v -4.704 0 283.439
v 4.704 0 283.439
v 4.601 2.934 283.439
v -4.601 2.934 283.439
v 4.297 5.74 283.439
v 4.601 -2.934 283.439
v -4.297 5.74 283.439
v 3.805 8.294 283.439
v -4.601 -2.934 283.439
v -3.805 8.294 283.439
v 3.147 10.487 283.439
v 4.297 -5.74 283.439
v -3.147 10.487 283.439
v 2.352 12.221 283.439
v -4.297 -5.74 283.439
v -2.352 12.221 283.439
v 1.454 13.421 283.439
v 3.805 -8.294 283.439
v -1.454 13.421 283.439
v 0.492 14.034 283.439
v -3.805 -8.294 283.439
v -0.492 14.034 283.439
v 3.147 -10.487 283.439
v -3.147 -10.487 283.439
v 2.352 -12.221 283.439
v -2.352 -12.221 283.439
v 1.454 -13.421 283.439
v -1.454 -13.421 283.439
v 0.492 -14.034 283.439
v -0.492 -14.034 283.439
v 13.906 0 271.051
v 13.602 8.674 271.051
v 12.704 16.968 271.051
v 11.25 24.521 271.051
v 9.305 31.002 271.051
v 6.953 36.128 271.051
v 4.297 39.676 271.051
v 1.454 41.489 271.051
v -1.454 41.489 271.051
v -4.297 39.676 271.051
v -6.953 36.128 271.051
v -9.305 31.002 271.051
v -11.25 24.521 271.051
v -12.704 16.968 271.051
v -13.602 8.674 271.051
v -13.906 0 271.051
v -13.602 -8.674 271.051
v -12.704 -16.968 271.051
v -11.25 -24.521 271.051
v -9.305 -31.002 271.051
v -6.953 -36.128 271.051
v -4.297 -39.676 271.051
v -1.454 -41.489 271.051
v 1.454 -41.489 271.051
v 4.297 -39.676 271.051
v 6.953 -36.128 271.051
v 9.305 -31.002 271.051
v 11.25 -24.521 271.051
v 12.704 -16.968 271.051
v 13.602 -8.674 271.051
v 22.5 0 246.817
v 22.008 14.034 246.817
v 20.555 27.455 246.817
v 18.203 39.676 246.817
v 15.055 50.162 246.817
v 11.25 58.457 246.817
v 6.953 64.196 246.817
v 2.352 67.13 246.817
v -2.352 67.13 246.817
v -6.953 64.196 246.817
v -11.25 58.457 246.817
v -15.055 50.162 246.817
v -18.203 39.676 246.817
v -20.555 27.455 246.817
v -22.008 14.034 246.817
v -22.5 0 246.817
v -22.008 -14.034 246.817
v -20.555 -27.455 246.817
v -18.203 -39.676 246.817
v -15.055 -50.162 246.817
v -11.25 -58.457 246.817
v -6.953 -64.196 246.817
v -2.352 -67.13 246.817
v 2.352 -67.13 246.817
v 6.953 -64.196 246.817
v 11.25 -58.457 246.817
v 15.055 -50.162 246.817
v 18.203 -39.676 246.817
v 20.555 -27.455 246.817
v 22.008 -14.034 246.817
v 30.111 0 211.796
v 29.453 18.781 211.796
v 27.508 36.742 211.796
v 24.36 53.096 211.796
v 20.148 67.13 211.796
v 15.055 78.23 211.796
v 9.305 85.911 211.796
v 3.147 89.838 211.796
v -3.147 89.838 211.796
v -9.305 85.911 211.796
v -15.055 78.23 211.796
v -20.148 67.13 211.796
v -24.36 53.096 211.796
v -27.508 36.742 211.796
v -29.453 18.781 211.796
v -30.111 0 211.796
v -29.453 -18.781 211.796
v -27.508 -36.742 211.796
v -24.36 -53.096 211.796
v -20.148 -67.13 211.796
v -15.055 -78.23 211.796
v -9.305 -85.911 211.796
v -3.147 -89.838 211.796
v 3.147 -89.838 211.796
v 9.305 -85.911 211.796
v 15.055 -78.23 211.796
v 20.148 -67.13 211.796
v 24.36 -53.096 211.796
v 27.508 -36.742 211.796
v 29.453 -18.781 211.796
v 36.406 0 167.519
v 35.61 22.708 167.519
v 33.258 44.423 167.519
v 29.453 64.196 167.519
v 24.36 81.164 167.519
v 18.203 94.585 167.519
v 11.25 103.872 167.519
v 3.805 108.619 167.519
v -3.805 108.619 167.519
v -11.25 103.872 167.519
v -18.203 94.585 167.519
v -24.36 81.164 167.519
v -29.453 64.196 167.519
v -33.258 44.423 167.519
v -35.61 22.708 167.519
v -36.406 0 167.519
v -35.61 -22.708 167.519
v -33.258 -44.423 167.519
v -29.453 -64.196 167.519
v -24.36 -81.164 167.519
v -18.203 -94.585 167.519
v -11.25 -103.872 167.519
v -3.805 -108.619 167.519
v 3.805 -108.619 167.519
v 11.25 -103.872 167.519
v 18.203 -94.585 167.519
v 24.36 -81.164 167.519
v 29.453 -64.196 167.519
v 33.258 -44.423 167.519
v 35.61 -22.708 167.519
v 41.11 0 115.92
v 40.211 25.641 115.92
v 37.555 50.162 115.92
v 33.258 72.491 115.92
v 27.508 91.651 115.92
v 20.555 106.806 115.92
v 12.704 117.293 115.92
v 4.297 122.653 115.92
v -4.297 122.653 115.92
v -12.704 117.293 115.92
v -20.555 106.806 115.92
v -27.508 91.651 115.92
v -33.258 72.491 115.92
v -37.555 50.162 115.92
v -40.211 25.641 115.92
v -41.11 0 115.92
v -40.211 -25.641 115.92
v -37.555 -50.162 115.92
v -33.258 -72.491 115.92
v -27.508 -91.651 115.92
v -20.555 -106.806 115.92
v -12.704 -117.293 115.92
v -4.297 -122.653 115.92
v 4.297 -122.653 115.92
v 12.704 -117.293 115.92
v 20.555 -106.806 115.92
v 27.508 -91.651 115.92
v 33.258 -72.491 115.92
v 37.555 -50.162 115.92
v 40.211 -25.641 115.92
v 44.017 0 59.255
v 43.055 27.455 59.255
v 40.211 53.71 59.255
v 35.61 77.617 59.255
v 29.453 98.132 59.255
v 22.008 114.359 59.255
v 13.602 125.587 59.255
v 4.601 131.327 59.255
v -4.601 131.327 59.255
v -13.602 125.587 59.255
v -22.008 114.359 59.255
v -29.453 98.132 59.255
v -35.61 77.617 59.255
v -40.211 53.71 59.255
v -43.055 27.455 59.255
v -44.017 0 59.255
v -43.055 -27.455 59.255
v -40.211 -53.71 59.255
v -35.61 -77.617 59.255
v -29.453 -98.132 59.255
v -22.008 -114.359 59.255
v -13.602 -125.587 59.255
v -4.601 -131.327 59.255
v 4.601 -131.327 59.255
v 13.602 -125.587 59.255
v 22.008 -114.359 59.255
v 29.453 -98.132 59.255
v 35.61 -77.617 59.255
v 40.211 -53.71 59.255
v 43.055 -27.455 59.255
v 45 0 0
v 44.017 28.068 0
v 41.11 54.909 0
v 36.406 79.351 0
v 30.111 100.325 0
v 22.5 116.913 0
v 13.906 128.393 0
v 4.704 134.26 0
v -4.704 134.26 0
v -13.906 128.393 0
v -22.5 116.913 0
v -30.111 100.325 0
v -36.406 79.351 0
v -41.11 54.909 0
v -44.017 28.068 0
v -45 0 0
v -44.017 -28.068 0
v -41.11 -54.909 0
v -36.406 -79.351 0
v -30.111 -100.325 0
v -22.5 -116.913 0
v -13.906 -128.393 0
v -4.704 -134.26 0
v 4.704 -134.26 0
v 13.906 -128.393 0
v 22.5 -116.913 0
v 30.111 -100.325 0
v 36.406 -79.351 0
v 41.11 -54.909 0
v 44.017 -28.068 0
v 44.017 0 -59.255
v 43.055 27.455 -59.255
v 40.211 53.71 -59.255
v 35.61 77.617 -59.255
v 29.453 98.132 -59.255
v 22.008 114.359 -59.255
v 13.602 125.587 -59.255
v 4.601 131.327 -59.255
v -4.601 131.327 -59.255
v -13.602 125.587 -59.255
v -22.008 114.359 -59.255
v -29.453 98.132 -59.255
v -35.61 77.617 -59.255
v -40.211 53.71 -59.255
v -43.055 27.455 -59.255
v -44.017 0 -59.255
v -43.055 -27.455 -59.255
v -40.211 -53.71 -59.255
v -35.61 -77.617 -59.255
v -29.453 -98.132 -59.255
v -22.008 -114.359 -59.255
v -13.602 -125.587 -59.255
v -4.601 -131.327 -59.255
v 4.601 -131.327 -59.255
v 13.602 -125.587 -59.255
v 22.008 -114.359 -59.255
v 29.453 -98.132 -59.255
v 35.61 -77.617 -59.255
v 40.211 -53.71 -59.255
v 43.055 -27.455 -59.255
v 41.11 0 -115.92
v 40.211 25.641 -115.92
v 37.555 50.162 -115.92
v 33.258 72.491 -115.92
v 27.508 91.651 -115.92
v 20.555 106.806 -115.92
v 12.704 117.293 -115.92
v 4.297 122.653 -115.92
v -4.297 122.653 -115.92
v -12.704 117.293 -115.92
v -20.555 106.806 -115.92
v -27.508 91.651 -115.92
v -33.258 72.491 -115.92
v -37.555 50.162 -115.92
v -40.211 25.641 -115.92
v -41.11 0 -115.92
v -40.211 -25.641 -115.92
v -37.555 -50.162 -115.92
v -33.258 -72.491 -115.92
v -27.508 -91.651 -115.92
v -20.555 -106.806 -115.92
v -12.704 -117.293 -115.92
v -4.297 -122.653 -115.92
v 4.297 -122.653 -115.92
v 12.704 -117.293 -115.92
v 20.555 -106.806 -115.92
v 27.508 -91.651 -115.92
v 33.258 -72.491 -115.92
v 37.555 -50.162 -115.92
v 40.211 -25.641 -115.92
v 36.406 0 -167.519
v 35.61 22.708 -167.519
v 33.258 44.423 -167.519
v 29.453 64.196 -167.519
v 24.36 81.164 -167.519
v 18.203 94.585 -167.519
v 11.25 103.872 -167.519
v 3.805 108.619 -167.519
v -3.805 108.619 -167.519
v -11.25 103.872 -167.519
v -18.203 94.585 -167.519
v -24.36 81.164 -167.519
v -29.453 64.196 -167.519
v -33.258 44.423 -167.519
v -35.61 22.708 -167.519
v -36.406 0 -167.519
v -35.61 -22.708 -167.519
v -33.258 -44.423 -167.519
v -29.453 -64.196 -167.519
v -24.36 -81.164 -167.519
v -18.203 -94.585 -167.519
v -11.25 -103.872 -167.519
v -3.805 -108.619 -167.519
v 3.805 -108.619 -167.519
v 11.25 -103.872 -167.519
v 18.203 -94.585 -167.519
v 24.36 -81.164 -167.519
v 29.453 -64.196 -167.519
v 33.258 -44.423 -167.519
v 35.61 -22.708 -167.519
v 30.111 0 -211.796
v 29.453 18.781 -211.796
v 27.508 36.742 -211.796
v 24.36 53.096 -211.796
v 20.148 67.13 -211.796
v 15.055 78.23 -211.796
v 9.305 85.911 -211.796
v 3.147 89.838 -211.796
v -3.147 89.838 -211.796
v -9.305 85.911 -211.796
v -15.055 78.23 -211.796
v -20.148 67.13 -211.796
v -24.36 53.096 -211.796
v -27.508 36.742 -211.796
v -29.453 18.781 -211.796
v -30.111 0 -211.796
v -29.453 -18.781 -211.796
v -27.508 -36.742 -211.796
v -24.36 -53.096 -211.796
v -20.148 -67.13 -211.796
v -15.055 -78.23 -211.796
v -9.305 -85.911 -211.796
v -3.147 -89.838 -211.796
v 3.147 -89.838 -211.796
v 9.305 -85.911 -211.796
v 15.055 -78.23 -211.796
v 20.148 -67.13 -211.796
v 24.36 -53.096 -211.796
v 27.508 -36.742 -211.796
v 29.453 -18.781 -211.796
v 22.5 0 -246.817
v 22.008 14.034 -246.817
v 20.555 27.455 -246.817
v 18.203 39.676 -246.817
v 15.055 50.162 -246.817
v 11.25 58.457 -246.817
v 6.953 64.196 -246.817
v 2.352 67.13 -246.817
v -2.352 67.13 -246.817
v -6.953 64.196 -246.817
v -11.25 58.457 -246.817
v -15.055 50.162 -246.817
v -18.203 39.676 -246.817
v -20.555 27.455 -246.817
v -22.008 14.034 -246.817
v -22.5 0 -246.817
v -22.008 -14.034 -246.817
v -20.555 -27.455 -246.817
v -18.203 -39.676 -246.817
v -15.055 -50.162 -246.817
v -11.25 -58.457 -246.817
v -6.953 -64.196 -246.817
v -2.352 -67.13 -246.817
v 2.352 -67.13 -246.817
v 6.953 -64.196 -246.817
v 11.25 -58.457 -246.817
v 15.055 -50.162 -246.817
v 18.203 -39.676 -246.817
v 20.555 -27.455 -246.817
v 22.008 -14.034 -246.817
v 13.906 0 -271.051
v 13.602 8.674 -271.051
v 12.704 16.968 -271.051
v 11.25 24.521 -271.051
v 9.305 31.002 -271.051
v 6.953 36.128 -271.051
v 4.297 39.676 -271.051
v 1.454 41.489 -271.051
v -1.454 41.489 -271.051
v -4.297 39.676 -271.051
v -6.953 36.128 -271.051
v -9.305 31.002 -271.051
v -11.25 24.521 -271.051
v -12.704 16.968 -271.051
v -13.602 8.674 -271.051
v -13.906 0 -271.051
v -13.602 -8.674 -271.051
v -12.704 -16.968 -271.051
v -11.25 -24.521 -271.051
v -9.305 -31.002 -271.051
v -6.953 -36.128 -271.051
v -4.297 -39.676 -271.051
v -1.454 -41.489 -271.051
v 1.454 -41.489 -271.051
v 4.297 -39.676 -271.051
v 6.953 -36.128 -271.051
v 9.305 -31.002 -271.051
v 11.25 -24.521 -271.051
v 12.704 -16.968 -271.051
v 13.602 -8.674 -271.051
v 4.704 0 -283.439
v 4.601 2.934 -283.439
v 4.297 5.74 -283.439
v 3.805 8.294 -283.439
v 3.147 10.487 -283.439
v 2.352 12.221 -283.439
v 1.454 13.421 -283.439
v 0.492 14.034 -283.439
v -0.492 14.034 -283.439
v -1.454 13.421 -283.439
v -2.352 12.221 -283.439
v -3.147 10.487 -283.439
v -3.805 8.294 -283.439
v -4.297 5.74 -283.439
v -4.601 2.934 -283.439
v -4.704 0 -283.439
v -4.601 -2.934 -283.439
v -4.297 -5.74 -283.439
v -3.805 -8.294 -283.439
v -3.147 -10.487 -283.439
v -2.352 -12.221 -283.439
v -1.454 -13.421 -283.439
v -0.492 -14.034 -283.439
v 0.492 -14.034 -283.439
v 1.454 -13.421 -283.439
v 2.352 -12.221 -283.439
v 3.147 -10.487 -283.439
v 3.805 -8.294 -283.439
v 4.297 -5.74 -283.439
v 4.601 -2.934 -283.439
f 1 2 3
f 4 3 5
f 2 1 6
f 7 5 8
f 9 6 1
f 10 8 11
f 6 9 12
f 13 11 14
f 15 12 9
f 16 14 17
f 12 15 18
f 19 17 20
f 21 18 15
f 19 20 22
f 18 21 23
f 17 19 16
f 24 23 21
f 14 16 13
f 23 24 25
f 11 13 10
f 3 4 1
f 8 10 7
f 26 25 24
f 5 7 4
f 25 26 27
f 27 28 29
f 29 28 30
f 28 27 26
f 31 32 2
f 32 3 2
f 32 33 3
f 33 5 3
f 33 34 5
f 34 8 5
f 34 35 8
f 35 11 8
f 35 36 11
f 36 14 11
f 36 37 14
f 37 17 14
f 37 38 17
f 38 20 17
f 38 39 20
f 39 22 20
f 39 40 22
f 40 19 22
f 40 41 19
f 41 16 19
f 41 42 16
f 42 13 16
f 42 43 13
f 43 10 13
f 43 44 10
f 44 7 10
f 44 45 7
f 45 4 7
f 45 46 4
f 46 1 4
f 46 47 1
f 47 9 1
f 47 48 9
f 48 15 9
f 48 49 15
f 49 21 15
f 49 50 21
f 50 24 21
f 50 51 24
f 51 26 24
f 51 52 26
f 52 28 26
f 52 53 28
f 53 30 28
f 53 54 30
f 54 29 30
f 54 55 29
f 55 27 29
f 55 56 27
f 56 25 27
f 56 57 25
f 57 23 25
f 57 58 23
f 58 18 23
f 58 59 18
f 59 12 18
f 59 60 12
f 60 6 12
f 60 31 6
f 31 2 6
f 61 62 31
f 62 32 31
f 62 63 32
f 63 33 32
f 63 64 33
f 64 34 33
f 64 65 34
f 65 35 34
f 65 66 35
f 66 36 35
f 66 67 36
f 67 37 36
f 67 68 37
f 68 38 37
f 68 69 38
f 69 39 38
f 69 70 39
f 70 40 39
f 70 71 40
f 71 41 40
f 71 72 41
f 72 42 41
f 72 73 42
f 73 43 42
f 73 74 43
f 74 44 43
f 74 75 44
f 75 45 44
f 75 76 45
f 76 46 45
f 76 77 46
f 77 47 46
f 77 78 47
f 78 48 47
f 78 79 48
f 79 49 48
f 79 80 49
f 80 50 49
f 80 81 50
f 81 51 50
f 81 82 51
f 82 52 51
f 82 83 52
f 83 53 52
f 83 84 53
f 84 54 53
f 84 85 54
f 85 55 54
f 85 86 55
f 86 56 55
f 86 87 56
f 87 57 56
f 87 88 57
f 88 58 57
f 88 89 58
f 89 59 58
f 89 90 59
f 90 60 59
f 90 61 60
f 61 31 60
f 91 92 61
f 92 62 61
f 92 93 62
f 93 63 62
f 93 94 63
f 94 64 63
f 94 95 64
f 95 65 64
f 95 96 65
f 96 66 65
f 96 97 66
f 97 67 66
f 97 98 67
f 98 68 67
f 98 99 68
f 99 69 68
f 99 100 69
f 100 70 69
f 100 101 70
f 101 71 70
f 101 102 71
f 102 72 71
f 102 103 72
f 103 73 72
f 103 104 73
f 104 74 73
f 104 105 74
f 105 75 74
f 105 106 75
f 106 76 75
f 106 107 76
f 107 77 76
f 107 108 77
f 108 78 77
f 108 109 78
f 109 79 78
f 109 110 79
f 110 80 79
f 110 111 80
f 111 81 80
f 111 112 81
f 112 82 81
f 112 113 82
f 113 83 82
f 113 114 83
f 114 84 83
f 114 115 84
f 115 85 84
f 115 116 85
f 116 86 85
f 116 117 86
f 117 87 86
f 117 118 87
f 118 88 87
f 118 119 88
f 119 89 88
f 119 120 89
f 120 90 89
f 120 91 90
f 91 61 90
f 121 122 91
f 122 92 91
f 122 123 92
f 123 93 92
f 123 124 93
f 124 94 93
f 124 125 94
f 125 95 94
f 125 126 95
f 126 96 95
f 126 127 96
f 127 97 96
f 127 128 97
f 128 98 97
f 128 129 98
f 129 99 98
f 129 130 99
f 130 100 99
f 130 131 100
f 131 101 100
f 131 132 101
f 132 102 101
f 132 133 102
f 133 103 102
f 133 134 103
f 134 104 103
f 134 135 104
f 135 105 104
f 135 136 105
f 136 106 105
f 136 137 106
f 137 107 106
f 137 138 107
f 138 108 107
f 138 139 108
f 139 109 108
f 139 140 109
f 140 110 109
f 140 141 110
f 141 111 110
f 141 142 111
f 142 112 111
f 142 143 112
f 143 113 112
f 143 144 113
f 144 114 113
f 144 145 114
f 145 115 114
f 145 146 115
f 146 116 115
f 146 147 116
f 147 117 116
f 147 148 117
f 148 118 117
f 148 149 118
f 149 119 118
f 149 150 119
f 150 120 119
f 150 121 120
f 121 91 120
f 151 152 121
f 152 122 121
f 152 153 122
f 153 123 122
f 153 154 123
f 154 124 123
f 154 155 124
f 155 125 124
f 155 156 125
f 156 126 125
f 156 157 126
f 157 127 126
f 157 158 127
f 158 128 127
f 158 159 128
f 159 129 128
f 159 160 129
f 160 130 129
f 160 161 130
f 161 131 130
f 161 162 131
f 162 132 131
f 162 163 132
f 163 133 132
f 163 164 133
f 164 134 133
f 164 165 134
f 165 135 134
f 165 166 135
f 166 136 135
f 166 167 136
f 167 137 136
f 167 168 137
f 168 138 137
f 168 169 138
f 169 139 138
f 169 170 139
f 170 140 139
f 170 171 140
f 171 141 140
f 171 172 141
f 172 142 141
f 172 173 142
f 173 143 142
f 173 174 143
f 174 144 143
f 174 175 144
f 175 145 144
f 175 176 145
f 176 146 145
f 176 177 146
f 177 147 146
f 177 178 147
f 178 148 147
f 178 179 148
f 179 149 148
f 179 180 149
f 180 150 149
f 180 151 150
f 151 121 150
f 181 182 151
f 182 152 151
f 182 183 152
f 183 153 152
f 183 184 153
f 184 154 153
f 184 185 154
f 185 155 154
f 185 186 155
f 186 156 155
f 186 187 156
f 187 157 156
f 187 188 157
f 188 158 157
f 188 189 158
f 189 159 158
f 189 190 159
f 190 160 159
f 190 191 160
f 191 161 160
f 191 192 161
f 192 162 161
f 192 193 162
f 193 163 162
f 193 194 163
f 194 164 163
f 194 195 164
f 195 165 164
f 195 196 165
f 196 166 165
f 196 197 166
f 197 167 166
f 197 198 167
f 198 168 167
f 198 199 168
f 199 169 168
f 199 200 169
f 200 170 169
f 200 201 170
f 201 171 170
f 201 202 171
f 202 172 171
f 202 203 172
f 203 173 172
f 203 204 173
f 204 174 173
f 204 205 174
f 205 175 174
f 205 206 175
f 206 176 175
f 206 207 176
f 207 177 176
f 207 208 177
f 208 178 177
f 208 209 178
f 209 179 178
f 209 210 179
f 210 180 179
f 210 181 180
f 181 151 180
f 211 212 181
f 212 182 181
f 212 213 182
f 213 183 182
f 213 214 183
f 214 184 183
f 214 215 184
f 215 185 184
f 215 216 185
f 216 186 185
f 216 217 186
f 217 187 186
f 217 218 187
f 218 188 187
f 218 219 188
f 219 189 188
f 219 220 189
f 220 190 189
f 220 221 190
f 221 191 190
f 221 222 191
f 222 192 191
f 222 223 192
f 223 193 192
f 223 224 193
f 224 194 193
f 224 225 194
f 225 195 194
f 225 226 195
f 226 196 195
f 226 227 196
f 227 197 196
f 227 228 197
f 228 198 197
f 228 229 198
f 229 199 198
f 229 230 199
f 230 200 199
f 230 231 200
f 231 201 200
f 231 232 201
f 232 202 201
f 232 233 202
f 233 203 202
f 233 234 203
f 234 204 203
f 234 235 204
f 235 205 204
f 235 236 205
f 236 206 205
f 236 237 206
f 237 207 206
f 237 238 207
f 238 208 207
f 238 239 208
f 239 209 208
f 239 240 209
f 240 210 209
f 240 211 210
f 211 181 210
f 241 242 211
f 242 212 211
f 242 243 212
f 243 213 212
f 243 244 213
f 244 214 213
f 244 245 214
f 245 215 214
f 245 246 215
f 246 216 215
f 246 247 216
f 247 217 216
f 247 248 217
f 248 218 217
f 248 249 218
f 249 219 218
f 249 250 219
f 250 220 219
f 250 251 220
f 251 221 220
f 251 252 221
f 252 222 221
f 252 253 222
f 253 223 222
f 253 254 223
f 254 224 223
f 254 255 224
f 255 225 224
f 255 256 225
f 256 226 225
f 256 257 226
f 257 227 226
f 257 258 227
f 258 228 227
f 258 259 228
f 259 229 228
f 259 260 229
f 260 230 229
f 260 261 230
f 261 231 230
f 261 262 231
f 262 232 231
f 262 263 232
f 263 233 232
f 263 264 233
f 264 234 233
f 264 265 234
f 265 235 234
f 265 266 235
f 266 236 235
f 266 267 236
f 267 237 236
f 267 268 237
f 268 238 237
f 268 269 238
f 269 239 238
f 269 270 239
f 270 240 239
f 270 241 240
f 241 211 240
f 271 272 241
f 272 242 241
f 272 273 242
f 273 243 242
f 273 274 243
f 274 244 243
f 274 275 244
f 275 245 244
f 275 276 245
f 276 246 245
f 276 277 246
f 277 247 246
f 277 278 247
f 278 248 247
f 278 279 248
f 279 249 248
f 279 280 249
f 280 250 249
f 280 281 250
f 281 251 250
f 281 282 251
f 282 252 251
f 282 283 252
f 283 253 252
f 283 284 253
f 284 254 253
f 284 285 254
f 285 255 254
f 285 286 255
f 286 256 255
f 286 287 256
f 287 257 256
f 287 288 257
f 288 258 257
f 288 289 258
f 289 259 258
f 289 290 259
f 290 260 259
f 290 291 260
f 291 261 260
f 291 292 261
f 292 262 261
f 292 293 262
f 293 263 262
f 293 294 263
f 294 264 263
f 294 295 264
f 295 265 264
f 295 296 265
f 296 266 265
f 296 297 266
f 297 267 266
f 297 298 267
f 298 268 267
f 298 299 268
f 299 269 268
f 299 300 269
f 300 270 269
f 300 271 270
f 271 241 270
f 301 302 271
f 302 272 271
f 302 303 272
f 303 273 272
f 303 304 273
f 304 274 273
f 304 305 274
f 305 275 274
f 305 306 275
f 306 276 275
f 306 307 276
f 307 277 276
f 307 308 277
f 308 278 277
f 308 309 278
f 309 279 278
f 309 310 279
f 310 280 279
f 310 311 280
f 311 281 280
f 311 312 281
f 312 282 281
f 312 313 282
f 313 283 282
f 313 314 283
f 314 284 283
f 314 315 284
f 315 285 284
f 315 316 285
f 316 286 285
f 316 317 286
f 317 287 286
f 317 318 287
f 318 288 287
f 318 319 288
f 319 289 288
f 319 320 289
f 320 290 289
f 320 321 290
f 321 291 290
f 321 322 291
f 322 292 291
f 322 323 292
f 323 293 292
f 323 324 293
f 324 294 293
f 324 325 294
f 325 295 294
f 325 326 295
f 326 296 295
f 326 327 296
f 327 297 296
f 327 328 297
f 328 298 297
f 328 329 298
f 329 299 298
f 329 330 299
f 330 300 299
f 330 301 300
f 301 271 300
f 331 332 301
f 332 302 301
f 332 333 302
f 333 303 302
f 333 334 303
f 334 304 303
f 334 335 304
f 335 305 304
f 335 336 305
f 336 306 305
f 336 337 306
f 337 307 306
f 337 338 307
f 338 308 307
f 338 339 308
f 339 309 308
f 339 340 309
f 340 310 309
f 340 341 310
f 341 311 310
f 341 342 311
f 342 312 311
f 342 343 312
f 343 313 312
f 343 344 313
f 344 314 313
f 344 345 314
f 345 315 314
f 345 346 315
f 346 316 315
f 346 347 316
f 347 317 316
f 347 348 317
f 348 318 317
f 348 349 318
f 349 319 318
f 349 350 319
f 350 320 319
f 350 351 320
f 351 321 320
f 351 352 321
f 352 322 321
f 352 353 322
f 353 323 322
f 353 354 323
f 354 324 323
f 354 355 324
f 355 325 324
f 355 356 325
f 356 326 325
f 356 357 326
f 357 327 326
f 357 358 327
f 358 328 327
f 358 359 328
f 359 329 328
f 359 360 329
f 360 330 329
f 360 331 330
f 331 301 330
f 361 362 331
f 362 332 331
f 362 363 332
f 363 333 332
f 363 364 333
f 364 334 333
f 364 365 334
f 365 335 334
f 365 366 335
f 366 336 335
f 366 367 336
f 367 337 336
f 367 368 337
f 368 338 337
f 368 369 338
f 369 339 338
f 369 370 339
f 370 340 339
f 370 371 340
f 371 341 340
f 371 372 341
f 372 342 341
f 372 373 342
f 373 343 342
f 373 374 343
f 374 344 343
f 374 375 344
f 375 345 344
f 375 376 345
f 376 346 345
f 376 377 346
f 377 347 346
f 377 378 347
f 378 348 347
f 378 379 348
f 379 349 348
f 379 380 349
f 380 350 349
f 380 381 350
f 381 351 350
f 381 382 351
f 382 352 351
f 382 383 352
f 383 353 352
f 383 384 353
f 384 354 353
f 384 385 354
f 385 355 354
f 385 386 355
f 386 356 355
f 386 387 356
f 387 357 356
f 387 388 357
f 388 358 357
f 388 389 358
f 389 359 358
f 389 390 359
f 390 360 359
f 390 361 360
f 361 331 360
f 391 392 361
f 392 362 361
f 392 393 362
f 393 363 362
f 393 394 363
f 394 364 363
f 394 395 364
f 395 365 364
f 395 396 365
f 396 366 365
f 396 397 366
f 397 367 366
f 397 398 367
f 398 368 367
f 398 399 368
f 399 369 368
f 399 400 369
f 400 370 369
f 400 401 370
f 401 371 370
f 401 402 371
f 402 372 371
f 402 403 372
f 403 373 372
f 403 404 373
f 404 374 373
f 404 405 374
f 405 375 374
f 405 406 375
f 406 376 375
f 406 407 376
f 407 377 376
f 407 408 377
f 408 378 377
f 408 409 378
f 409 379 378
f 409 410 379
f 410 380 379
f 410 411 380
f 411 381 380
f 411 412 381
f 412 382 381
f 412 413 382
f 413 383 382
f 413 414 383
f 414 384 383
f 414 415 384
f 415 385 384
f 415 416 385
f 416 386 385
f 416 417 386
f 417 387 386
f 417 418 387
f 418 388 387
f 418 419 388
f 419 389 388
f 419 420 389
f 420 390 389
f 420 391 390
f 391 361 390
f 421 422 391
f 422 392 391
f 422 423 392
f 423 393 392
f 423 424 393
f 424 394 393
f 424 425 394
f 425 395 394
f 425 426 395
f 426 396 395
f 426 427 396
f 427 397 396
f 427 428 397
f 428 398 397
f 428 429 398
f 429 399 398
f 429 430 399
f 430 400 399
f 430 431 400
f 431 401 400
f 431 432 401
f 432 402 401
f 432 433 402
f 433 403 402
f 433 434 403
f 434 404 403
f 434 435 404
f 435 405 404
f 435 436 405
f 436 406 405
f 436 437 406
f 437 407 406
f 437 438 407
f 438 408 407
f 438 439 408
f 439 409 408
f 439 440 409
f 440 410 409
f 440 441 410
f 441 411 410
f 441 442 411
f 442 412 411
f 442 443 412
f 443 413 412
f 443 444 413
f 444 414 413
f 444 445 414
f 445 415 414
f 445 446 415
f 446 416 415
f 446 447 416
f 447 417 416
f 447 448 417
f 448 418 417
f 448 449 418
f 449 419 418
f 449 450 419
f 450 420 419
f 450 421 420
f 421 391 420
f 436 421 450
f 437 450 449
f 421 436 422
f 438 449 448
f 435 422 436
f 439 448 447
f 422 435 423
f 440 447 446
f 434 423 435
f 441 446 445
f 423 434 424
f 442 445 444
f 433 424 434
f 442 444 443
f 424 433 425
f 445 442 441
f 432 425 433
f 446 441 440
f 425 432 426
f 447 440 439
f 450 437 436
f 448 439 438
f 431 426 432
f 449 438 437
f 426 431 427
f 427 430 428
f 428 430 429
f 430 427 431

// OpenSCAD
// Generated by SolidPython 1.0.1 on 2020-07-29 00:46:45


scale(v = [3, 9, 19]) {
	sphere(r = 15);
}
/***********************************************
*********      SolidPython code:      **********
************************************************
 
# import packages: SolidPython
from solid import *
from solid.utils import *
from itertools import chain, combinations, permutations


class Resize:

    def __init__(self, scad_file):
        self.scad_file = scad_file
        #self.scad_file = import_scad(scad_file)
        # cone/cylinder param:
        self.r1 = 0
        self.r2 = 0
        self.h = 0
        # rectangular prism param:
        self.w = 0
        self.l = 0
        # ellipse param:
        self.r = 0

    # import OpenScad code (file name corresponds to shape)


    # classify shape + parameters
    def assign(self, param1, param2, param3):
        if self.scad_file == 'cone.scad':
            self.r1 = param1
            self.r2 = param2
            self.h = param3
        elif self.scad_file == 'cylinder.scad':
            self.r1 = param1
            self.r2 = param2
            self.h = param3
        elif self.scad_file == 'rectangularPrism.scad':
            self.h = param1
            self.l = param2
            self.w = param3
        else:
            self.r = param1
            self.h = param2

    # resize parameters
    def iterate(self):
        x = range(3, 20, 2)
        i = 1
        if self.scad_file == 'cone.scad':
            tempList = list(permutations(x, 2))
            for temp in tempList:
                param1 = temp[0]
                param2 = temp[1]
                filepath = 'produced_scad_files/' + 'cone' + str(param1) + '_' + str(param2) + '_' + '.scad'
                scad_render_to_file(cylinder(h=param1, r1=param2, r2=0), filepath)

        elif self.scad_file == 'cylinder.scad':
            tempList = list(permutations(x, 3))
            for temp in tempList:
                param1 = temp[0]
                param2 = temp[1]
                filepath = 'produced_scad_files/' + 'cylinder' + str(param1) + '_' + str(param2) + '_' + '.scad'
                scad_render_to_file(cylinder(h=param1, r1=param2, r2=param2), filepath)

        elif self.scad_file == 'rectangularPrism.scad':
            tempList = list(permutations(x, 3))
            for temp in tempList:
                param1 = temp[0]
                param2 = temp[1]
                param3 = temp[2]
                filepath = 'produced_scad_files/' + 'rectangularPrism' + str(param1) + '_' + str(param2) + '_' + str(
                    param3) + '.scad'
                scad_render_to_file(cube(size=(param1, param2, param3)), filepath)

        elif self.scad_file == 'ellipse.scad':
            tempList = list(permutations(x, 4))
            for temp in tempList:
                param1 = temp[0]
                param2 = temp[1]
                param3 = temp[2]
                param4 = temp[3]
                filepath = 'produced_scad_files/' + 'ellipse' + str(param1) + '_' + str(param2) + '_' + str(param3) + '_' + str(param4) + '.scad'
                scad_render_to_file(scale([param1, param2, param3])(sphere(r=param4)), filepath)

    def render_to_scadfile(self):
        scad_render_to_file(scad, 'example.scad') 
 
************************************************/
